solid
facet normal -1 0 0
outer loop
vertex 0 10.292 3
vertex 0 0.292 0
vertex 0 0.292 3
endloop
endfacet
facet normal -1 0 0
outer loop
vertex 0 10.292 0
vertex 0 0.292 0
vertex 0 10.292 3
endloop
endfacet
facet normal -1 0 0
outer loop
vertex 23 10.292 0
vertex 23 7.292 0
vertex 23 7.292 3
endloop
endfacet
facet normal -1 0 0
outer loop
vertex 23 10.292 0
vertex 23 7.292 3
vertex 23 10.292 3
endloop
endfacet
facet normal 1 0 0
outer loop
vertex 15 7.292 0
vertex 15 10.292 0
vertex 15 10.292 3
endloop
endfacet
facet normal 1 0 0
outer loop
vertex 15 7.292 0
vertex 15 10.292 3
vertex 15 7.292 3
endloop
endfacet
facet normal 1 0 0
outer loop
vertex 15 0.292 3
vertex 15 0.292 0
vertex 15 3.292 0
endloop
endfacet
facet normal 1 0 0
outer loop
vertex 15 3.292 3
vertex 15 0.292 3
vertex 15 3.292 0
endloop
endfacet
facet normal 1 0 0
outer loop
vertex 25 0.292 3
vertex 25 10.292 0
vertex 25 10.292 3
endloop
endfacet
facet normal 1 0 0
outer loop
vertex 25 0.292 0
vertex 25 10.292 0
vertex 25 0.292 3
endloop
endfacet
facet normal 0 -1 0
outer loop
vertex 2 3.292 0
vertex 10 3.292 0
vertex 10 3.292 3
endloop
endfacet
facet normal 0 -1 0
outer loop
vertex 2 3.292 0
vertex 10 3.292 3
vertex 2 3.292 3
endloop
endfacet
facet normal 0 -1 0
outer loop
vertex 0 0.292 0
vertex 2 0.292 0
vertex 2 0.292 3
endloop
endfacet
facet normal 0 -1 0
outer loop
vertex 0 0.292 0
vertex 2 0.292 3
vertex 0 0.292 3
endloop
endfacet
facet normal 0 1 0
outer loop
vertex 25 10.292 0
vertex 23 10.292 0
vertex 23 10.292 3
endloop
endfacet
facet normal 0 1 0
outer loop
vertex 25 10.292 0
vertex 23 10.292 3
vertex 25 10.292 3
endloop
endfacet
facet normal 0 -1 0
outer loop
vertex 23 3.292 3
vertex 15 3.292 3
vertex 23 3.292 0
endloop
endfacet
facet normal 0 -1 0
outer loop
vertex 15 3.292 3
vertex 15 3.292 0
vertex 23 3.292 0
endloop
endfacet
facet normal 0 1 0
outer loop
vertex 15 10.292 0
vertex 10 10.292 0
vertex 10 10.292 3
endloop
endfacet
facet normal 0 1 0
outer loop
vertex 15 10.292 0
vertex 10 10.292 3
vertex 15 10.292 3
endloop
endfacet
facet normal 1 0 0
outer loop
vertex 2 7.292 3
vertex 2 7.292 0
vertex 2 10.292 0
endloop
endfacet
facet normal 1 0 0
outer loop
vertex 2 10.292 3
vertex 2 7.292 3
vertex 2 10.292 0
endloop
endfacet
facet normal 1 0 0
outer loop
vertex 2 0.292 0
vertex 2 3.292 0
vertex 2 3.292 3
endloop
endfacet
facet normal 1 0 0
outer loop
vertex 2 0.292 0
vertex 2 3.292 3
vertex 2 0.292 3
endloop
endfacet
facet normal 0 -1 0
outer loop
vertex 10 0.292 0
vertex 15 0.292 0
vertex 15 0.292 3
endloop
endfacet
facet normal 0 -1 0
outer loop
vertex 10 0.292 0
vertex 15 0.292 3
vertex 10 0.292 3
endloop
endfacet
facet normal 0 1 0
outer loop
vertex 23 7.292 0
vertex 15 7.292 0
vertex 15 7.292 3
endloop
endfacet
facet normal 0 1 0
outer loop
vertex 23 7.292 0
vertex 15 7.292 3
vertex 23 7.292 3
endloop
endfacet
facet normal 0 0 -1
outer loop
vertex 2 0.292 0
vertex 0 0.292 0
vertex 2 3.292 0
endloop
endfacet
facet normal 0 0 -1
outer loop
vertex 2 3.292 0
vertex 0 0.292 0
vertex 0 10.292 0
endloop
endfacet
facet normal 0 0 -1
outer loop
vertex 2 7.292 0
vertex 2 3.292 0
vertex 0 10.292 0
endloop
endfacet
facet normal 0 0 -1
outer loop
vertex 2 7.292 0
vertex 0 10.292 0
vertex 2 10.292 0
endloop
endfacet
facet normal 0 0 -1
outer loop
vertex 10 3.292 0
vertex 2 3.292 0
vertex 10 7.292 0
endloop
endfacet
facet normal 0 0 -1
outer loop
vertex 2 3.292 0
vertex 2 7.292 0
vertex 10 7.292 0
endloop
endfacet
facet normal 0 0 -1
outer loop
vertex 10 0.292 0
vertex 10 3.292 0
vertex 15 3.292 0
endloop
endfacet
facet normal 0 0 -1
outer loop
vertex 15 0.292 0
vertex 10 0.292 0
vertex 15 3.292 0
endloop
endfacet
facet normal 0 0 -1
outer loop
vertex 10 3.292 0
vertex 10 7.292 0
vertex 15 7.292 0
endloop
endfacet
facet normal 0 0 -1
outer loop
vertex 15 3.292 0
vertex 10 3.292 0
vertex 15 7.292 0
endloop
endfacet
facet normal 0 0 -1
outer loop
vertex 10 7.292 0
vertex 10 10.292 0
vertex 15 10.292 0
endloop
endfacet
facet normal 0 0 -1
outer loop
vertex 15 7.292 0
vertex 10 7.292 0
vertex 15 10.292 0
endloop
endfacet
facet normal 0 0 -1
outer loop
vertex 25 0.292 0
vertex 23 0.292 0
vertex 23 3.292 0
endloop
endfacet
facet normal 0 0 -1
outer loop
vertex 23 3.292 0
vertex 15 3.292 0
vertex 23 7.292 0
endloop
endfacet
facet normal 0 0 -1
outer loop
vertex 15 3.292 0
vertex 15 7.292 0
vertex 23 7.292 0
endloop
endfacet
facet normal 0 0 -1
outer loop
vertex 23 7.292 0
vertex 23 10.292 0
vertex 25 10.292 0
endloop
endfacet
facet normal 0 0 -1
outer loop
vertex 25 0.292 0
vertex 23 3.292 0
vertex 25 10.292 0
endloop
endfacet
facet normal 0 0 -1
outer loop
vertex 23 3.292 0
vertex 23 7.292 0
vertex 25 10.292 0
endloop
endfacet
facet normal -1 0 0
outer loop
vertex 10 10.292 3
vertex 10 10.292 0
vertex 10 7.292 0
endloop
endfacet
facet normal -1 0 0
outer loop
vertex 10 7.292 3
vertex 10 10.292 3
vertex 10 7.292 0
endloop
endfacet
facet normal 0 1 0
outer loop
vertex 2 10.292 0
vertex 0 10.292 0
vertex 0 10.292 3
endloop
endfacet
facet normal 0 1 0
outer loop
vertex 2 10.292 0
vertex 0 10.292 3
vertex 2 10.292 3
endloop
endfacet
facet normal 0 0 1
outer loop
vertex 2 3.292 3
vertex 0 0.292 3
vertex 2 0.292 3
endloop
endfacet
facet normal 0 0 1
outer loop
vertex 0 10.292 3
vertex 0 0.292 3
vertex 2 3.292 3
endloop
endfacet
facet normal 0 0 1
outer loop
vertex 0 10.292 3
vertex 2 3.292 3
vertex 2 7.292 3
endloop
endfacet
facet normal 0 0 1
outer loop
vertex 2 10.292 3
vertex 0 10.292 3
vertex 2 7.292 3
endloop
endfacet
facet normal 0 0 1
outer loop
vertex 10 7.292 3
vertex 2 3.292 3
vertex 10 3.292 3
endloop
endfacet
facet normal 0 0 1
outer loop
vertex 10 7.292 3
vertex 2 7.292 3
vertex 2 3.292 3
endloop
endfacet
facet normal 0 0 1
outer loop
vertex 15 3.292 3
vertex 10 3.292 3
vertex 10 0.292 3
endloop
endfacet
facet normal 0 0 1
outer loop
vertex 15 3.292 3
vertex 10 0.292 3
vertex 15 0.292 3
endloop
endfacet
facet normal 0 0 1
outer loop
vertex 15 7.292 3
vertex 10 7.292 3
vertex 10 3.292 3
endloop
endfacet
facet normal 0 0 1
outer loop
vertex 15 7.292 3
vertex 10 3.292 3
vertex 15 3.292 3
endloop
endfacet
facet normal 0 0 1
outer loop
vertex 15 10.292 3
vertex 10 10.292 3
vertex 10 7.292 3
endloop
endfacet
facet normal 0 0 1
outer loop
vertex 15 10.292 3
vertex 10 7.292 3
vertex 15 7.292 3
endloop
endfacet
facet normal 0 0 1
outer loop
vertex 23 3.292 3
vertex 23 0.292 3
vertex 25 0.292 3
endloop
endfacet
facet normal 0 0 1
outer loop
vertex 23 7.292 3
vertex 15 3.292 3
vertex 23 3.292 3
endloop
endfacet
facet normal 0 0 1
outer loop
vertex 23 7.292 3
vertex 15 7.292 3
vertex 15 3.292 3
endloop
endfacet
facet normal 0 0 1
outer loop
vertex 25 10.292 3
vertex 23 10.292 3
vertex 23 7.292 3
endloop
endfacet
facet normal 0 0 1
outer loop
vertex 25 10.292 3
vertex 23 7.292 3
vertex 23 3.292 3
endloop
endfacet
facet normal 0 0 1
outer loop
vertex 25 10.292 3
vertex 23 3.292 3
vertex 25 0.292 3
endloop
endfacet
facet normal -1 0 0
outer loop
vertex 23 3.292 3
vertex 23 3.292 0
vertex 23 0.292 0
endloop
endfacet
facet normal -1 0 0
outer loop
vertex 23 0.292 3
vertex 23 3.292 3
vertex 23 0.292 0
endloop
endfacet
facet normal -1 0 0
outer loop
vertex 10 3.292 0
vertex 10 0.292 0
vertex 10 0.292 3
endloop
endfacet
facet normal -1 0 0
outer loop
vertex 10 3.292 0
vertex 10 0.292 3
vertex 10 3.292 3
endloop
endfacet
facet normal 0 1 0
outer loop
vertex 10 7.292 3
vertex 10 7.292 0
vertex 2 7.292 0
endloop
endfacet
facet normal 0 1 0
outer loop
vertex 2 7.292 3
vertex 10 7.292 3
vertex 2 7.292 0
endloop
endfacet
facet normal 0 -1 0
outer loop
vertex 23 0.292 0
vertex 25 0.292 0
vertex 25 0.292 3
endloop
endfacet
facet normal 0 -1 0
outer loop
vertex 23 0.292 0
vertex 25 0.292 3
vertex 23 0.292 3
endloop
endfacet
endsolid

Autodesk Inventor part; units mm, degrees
ref_plane "YZ Plane" through (0, 0, 0) normal (1, 0, 0) x (0, 1, 0)
ref_plane "XZ Plane" through (0, 0, 0) normal (0, 1, 0) x (-1, 0, 0)
ref_plane "XY Plane" through (0, 0, 0) normal (0, 0, 1) x (1, 0, 0)
sketch "Sketch1" plane through (0, 0, 0) normal (0, 0, 1) x (1, 0, 0)
  line L0 (0, 10.2918) -> (25, 10.2918)
  line L1 (25, 10.2918) -> (25, 0.2918)
  line L2 (25, 0.2918) -> (0, 0.2918)
  line L3 (0, 0.2918) -> (0, 10.2918)
  line L4 (2, 0.2918) -> (10, 0.2918)
  line L5 (10, 0.2918) -> (10, 3.2918)
  line L6 (10, 3.2918) -> (2, 3.2918)
  line L7 (2, 3.2918) -> (2, 0.2918)
  line L8 (0, 5.2918) -> (25, 5.2918) construction
  line L9 (12.5, 10.2918) -> (12.5, 0.2918) construction
  line L10 (23, 0.2918) -> (15, 0.2918)
  line L11 (15, 0.2918) -> (15, 3.2918)
  line L12 (15, 3.2918) -> (23, 3.2918)
  line L13 (23, 3.2918) -> (23, 0.2918)
  line L14 (2, 10.2918) -> (10, 10.2918)
  line L15 (10, 10.2918) -> (10, 7.2918)
  line L16 (10, 7.2918) -> (2, 7.2918)
  line L17 (2, 7.2918) -> (2, 10.2918)
  line L18 (23, 10.2918) -> (15, 10.2918)
  line L19 (15, 10.2918) -> (15, 7.2918)
  line L20 (15, 7.2918) -> (23, 7.2918)
  line L21 (23, 7.2918) -> (23, 10.2918)
  point P0 (0, 0)
  dimension "d0" = 25
  dimension "d1" = 10
  dimension "d2" = 3
  dimension "d3" = 2
  dimension "d4" = 8
extrude "Extrusion1" add sketch "Sketch1" along normal blind 3 contours L0 L17 L16 L15 L19 L20 L21 L1 L2 L13 L12 L11 L5 L6 L7 L3
properties part number "techoProctetorSensorHal"
